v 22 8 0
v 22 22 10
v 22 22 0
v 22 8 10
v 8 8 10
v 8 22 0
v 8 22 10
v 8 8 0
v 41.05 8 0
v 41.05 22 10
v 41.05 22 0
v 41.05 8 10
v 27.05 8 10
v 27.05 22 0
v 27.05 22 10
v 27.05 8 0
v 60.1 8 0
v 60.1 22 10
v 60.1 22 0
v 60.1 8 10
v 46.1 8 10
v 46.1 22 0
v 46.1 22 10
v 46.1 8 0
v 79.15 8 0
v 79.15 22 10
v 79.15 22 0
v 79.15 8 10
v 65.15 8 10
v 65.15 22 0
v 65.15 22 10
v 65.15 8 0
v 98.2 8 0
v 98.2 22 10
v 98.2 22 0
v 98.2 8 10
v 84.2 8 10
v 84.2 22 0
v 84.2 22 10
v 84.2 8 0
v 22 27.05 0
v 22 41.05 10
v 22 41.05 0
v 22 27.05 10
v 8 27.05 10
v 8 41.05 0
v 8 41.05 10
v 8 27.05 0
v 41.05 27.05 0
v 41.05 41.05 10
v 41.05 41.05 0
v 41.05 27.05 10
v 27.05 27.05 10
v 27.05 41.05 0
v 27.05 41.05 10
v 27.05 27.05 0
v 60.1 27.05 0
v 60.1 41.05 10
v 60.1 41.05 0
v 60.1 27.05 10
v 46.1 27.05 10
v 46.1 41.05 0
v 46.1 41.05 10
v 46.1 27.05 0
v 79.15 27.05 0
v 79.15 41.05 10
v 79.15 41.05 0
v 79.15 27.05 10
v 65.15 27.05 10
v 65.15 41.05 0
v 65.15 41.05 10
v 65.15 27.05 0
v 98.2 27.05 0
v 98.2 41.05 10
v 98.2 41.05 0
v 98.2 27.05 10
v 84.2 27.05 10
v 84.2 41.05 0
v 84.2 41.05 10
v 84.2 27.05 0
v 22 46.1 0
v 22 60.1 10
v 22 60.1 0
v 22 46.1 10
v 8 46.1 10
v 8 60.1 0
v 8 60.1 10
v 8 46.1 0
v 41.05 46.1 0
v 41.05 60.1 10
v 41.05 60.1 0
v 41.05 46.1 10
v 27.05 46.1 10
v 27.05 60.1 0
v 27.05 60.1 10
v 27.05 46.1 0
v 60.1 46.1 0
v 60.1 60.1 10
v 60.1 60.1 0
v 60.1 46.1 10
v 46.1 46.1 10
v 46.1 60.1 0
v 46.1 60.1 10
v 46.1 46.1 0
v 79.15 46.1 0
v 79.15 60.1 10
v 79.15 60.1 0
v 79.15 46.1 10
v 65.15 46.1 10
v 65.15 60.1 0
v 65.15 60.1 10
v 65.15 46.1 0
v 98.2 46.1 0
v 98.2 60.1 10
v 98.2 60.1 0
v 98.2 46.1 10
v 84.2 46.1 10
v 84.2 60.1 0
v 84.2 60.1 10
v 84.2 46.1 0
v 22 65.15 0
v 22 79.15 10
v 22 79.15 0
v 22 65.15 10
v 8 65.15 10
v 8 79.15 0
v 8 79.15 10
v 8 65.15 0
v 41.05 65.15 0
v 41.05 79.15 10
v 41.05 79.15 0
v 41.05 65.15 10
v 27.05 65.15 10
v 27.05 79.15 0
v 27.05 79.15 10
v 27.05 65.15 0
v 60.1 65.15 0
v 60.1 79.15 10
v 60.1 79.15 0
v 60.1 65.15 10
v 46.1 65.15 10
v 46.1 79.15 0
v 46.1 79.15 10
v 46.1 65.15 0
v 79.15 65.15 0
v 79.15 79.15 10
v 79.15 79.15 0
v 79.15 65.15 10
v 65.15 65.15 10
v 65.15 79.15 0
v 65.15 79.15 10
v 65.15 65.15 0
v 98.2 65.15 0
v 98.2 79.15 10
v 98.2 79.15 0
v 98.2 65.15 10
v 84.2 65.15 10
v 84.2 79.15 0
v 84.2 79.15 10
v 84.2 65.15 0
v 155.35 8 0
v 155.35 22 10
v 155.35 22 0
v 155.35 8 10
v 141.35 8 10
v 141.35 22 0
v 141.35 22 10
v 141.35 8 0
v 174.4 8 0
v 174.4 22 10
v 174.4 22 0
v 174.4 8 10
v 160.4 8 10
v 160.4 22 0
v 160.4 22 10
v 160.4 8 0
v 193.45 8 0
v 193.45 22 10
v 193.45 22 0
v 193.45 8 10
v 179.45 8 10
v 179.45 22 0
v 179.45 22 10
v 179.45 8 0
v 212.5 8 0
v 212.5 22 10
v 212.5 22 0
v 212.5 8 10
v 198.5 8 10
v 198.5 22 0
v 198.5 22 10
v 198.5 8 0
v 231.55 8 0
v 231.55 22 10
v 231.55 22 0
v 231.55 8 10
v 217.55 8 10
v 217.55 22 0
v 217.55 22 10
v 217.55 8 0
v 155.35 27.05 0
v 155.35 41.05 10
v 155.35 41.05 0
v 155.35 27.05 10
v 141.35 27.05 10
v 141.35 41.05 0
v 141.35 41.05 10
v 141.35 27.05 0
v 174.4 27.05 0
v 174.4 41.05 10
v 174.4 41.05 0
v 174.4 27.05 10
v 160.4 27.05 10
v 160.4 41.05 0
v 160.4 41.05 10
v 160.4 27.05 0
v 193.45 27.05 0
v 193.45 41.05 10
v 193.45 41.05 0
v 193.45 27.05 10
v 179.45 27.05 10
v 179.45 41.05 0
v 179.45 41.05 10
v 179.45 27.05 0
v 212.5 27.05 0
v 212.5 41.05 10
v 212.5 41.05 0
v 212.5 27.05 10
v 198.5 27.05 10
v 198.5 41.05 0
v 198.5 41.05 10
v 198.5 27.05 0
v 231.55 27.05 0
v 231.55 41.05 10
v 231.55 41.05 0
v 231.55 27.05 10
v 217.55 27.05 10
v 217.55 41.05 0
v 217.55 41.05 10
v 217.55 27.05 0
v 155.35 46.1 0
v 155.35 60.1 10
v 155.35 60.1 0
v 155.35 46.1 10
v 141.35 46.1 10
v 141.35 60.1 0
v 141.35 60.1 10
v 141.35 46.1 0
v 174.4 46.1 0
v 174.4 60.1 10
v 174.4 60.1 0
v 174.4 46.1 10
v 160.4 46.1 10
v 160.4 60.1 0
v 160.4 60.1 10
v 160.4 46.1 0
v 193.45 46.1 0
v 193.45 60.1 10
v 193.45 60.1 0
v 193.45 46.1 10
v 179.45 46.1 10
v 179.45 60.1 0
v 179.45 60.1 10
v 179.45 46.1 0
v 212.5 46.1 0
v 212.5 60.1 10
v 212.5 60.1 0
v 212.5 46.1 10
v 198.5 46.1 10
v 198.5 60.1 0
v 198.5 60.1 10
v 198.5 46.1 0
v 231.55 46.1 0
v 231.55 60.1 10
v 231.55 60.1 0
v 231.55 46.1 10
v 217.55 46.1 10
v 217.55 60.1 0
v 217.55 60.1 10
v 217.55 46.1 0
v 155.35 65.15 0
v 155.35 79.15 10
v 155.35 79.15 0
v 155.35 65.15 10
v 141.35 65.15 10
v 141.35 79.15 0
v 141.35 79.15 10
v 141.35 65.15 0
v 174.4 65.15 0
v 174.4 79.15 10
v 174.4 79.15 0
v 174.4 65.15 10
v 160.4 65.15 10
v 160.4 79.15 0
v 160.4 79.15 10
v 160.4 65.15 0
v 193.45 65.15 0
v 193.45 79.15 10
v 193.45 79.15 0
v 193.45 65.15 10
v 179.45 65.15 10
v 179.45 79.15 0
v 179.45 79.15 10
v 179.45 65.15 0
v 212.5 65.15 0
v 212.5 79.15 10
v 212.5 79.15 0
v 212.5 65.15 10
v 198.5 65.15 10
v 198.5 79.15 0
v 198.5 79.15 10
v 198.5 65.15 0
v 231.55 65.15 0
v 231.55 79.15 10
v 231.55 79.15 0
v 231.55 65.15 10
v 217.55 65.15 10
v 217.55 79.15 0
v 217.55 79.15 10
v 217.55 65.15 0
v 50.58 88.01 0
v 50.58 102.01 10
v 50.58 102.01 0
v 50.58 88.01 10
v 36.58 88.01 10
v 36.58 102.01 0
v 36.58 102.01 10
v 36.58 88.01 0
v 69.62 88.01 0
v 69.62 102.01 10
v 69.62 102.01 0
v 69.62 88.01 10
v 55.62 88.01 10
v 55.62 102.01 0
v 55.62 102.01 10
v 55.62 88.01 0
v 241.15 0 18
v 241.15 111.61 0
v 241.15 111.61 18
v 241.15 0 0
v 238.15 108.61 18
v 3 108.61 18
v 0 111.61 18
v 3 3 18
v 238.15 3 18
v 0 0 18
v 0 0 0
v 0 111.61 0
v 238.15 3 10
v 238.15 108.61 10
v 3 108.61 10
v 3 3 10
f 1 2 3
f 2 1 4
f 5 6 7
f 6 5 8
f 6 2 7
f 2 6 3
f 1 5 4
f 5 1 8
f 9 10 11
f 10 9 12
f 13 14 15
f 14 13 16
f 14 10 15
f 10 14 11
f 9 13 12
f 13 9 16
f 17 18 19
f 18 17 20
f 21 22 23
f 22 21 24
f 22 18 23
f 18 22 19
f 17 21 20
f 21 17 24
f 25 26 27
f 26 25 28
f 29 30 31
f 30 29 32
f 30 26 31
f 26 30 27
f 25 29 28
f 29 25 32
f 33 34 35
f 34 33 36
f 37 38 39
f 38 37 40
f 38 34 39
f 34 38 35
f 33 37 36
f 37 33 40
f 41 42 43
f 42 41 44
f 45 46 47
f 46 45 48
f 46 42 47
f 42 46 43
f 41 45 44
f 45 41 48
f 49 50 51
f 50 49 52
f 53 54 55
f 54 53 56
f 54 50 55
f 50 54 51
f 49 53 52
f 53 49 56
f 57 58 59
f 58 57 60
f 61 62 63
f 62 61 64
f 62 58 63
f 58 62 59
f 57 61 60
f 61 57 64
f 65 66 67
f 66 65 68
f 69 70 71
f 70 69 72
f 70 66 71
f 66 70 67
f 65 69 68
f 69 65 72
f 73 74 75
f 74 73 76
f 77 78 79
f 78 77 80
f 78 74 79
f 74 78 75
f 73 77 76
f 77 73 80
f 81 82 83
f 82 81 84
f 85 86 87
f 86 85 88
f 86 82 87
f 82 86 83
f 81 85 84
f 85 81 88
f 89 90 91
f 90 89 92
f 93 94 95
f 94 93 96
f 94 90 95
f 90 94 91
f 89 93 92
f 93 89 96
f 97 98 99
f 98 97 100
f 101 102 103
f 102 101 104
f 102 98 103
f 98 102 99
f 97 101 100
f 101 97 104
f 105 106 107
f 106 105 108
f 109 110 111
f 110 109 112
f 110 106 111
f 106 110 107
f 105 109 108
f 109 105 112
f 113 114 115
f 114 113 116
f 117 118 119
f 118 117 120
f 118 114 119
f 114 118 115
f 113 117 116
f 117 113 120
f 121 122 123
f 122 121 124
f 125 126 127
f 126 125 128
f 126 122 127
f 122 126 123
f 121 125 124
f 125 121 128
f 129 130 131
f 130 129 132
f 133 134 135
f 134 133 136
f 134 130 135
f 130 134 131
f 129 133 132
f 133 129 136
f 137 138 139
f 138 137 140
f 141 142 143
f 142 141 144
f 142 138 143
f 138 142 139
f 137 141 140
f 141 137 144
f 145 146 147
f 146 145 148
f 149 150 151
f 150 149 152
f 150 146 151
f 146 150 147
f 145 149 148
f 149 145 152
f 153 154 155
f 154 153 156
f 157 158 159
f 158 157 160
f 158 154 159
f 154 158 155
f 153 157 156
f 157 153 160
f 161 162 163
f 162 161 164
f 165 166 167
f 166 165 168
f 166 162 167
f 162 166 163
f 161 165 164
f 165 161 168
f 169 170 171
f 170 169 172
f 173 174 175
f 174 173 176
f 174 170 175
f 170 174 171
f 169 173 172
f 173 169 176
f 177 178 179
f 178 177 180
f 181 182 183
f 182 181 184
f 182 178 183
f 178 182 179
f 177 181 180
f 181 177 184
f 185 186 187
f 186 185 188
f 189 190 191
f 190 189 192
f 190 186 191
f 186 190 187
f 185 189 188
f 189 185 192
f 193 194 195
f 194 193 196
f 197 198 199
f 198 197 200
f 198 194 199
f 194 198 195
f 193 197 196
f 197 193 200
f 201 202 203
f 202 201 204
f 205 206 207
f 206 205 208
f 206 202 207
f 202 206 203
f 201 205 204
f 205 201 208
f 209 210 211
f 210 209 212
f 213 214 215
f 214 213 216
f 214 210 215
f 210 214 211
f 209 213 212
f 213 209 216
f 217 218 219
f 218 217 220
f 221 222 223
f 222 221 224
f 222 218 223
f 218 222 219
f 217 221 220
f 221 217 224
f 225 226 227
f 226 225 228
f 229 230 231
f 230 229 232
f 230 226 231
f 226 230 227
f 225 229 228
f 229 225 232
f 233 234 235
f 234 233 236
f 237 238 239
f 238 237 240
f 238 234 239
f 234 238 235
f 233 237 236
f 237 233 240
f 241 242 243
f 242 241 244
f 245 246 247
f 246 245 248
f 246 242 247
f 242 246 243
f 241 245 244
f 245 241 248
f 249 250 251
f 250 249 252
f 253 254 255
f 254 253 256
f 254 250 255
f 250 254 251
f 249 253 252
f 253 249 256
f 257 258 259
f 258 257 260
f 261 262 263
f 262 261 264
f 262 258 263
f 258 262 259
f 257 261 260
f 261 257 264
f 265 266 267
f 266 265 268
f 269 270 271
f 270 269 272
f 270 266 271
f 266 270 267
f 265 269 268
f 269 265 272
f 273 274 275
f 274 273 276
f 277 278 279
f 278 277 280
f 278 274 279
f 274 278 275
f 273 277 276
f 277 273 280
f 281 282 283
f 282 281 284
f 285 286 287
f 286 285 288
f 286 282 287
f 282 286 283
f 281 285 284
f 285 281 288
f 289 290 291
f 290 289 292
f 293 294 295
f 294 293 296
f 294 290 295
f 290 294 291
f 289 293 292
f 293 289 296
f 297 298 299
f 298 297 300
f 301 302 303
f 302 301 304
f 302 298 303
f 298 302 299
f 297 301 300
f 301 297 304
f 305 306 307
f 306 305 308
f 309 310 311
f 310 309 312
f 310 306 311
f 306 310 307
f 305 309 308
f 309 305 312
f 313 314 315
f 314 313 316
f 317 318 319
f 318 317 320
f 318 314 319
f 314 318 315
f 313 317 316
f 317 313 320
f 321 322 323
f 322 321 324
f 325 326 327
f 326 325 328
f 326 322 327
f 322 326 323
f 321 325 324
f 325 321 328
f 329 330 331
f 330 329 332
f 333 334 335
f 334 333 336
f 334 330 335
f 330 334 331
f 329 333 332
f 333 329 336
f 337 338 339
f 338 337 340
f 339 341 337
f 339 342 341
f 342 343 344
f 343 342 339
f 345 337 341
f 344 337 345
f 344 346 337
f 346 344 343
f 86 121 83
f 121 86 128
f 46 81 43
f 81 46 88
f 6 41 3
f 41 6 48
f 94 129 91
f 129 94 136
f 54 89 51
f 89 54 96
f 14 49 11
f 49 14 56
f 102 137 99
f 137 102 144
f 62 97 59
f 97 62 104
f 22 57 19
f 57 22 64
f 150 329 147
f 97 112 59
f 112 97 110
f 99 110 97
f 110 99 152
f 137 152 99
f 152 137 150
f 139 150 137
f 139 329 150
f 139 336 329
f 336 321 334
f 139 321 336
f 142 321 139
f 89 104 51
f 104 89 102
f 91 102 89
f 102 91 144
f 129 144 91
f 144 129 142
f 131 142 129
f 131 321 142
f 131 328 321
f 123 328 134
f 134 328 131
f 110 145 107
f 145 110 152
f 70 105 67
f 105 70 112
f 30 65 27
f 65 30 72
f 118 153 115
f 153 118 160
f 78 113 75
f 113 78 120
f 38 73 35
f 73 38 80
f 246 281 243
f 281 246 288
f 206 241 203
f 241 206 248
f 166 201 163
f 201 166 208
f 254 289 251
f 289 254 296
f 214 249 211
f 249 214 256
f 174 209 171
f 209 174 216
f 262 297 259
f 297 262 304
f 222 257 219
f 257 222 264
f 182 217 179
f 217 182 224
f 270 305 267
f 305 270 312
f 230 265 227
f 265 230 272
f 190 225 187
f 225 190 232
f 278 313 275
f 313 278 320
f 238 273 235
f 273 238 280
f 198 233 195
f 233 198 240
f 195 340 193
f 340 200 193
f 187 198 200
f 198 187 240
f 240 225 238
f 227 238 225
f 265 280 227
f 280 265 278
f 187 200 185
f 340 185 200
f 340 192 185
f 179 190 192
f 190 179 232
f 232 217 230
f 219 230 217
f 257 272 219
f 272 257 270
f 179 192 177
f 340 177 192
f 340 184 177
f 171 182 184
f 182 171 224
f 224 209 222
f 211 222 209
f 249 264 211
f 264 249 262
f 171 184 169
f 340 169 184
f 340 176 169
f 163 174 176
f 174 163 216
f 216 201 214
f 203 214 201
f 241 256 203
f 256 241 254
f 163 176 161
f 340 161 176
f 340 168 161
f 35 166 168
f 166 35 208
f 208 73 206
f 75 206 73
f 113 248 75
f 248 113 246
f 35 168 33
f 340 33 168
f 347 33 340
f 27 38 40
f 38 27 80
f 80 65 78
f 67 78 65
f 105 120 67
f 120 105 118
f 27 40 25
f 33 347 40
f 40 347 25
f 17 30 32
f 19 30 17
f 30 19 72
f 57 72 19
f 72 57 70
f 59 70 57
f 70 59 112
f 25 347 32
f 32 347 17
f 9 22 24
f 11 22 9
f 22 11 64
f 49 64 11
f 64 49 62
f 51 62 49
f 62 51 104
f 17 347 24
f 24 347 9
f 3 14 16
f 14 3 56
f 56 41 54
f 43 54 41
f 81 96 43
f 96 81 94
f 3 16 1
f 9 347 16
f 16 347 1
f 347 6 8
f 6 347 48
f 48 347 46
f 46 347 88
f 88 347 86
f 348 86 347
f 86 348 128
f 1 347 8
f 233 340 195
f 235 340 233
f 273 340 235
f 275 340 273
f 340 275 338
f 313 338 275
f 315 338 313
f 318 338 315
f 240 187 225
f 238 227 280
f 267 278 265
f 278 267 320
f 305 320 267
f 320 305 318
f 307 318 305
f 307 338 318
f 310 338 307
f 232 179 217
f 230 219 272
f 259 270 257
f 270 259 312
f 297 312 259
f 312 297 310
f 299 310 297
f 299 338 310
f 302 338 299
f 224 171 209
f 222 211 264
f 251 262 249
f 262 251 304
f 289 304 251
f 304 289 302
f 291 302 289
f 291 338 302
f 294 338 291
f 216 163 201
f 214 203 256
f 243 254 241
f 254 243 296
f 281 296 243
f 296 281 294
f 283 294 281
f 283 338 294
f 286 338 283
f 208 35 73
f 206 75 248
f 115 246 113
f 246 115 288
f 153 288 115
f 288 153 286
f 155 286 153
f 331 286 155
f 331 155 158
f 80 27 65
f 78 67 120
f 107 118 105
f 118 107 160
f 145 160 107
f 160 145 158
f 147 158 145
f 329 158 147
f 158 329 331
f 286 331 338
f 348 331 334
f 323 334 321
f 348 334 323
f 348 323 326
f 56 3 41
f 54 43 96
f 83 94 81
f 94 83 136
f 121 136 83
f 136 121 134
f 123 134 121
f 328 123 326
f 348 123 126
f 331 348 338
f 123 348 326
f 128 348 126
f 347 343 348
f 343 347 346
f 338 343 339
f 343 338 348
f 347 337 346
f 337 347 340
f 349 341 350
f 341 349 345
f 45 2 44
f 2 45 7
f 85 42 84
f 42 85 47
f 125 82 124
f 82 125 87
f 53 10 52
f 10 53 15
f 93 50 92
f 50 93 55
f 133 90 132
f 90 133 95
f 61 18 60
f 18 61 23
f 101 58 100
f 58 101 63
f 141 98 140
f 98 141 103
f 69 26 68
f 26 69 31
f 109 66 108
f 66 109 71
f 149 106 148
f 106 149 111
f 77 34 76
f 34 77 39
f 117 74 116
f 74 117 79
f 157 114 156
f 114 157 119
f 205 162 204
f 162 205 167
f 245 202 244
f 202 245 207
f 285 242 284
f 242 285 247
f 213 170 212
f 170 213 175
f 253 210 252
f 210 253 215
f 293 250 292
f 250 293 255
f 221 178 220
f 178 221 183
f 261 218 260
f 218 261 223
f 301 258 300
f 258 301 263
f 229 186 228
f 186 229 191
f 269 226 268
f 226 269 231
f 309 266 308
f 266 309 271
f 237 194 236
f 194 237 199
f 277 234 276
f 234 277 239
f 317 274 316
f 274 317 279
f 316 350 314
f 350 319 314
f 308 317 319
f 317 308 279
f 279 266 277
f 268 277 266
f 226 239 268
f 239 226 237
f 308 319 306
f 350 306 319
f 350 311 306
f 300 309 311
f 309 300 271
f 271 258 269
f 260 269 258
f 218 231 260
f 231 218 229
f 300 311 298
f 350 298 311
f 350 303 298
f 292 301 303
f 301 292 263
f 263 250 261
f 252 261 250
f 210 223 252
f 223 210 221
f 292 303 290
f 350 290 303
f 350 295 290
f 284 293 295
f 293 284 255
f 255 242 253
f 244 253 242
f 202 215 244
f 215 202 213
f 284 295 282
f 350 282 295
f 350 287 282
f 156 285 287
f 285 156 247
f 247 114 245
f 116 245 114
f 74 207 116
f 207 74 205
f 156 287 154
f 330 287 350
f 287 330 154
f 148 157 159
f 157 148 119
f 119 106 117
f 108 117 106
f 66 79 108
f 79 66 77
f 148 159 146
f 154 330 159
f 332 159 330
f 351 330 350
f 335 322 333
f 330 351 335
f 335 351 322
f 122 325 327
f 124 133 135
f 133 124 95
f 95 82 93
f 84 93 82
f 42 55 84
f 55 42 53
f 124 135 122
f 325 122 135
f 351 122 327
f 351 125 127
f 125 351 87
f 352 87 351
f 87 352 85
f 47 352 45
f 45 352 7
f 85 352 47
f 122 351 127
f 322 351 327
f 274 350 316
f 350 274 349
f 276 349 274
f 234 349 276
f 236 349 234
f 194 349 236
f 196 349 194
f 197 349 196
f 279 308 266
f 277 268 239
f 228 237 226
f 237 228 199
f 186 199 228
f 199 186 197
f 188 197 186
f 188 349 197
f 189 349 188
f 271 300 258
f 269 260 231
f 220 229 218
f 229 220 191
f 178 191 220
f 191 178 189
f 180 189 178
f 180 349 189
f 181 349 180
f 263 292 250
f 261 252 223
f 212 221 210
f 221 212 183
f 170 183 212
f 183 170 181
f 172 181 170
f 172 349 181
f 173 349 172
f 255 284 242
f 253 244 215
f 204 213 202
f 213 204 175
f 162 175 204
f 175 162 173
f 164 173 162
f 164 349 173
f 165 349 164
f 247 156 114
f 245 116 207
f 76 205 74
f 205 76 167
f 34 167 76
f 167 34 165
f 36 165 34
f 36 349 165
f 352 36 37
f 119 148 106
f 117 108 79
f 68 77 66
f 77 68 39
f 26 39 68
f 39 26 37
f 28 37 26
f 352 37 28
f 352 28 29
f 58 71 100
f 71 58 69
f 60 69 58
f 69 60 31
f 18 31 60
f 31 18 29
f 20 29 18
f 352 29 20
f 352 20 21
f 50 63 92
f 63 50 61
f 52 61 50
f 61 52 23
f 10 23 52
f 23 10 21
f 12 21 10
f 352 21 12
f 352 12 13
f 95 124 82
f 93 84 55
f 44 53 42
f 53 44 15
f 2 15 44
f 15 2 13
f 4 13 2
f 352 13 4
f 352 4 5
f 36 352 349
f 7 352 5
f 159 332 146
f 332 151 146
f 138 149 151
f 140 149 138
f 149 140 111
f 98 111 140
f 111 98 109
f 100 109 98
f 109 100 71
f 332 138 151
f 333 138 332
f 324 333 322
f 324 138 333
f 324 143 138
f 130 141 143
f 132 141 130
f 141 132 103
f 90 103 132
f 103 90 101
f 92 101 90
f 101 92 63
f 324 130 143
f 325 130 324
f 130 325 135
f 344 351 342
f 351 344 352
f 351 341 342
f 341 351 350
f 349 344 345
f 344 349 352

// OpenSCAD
// Generated keyboard case
// Layout: Custom (44 keys)
// Switch type: Cherry MX
// Split keyboard: unified case

// Parameters
case_width = 241.15;
case_height = 111.61;
case_depth = 18.00;
wall_thickness = 3.00;
base_height = 10.00;
switch_cutout_size = 14.00;
key_spacing = 19.05;

module keyboard_case() {
    difference() {
        // Outer shell
        translate([0, 0, 0])
            cube([case_width, case_height, case_depth]);

        // Inner cavity
        translate([wall_thickness, wall_thickness, base_height])
            cube([case_width - 2*wall_thickness, 
                  case_height - 2*wall_thickness, 
                  case_depth - base_height + 1]);

        // Switch cutouts
        translate([wall_thickness + 5 - 0.00, wall_thickness + 5 - 0.00, -1])
            switch_plate();
    }
}

module switch_plate() {
    translate([0.00, 0.00, 0])
        cube([switch_cutout_size, switch_cutout_size, base_height + 2]);
    translate([19.05, 0.00, 0])
        cube([switch_cutout_size, switch_cutout_size, base_height + 2]);
    translate([38.10, 0.00, 0])
        cube([switch_cutout_size, switch_cutout_size, base_height + 2]);
    translate([57.15, 0.00, 0])
        cube([switch_cutout_size, switch_cutout_size, base_height + 2]);
    translate([76.20, 0.00, 0])
        cube([switch_cutout_size, switch_cutout_size, base_height + 2]);
    translate([0.00, 19.05, 0])
        cube([switch_cutout_size, switch_cutout_size, base_height + 2]);
    translate([19.05, 19.05, 0])
        cube([switch_cutout_size, switch_cutout_size, base_height + 2]);
    translate([38.10, 19.05, 0])
        cube([switch_cutout_size, switch_cutout_size, base_height + 2]);
    translate([57.15, 19.05, 0])
        cube([switch_cutout_size, switch_cutout_size, base_height + 2]);
    translate([76.20, 19.05, 0])
        cube([switch_cutout_size, switch_cutout_size, base_height + 2]);
    translate([0.00, 38.10, 0])
        cube([switch_cutout_size, switch_cutout_size, base_height + 2]);
    translate([19.05, 38.10, 0])
        cube([switch_cutout_size, switch_cutout_size, base_height + 2]);
    translate([38.10, 38.10, 0])
        cube([switch_cutout_size, switch_cutout_size, base_height + 2]);
    translate([57.15, 38.10, 0])
        cube([switch_cutout_size, switch_cutout_size, base_height + 2]);
    translate([76.20, 38.10, 0])
        cube([switch_cutout_size, switch_cutout_size, base_height + 2]);
    translate([0.00, 57.15, 0])
        cube([switch_cutout_size, switch_cutout_size, base_height + 2]);
    translate([19.05, 57.15, 0])
        cube([switch_cutout_size, switch_cutout_size, base_height + 2]);
    translate([38.10, 57.15, 0])
        cube([switch_cutout_size, switch_cutout_size, base_height + 2]);
    translate([57.15, 57.15, 0])
        cube([switch_cutout_size, switch_cutout_size, base_height + 2]);
    translate([76.20, 57.15, 0])
        cube([switch_cutout_size, switch_cutout_size, base_height + 2]);
    translate([133.35, 0.00, 0])
        cube([switch_cutout_size, switch_cutout_size, base_height + 2]);
    translate([152.40, 0.00, 0])
        cube([switch_cutout_size, switch_cutout_size, base_height + 2]);
    translate([171.45, 0.00, 0])
        cube([switch_cutout_size, switch_cutout_size, base_height + 2]);
    translate([190.50, 0.00, 0])
        cube([switch_cutout_size, switch_cutout_size, base_height + 2]);
    translate([209.55, 0.00, 0])
        cube([switch_cutout_size, switch_cutout_size, base_height + 2]);
    translate([133.35, 19.05, 0])
        cube([switch_cutout_size, switch_cutout_size, base_height + 2]);
    translate([152.40, 19.05, 0])
        cube([switch_cutout_size, switch_cutout_size, base_height + 2]);
    translate([171.45, 19.05, 0])
        cube([switch_cutout_size, switch_cutout_size, base_height + 2]);
    translate([190.50, 19.05, 0])
        cube([switch_cutout_size, switch_cutout_size, base_height + 2]);
    translate([209.55, 19.05, 0])
        cube([switch_cutout_size, switch_cutout_size, base_height + 2]);
    translate([133.35, 38.10, 0])
        cube([switch_cutout_size, switch_cutout_size, base_height + 2]);
    translate([152.40, 38.10, 0])
        cube([switch_cutout_size, switch_cutout_size, base_height + 2]);
    translate([171.45, 38.10, 0])
        cube([switch_cutout_size, switch_cutout_size, base_height + 2]);
    translate([190.50, 38.10, 0])
        cube([switch_cutout_size, switch_cutout_size, base_height + 2]);
    translate([209.55, 38.10, 0])
        cube([switch_cutout_size, switch_cutout_size, base_height + 2]);
    translate([133.35, 57.15, 0])
        cube([switch_cutout_size, switch_cutout_size, base_height + 2]);
    translate([152.40, 57.15, 0])
        cube([switch_cutout_size, switch_cutout_size, base_height + 2]);
    translate([171.45, 57.15, 0])
        cube([switch_cutout_size, switch_cutout_size, base_height + 2]);
    translate([190.50, 57.15, 0])
        cube([switch_cutout_size, switch_cutout_size, base_height + 2]);
    translate([209.55, 57.15, 0])
        cube([switch_cutout_size, switch_cutout_size, base_height + 2]);
    translate([28.58, 80.01, 0])
        cube([switch_cutout_size, switch_cutout_size, base_height + 2]);
    translate([28.58, 80.01, 0])
        cube([switch_cutout_size, switch_cutout_size, base_height + 2]);
    translate([47.62, 80.01, 0])
        cube([switch_cutout_size, switch_cutout_size, base_height + 2]);
    translate([47.62, 80.01, 0])
        cube([switch_cutout_size, switch_cutout_size, base_height + 2]);
}

// Generate the case
keyboard_case();
